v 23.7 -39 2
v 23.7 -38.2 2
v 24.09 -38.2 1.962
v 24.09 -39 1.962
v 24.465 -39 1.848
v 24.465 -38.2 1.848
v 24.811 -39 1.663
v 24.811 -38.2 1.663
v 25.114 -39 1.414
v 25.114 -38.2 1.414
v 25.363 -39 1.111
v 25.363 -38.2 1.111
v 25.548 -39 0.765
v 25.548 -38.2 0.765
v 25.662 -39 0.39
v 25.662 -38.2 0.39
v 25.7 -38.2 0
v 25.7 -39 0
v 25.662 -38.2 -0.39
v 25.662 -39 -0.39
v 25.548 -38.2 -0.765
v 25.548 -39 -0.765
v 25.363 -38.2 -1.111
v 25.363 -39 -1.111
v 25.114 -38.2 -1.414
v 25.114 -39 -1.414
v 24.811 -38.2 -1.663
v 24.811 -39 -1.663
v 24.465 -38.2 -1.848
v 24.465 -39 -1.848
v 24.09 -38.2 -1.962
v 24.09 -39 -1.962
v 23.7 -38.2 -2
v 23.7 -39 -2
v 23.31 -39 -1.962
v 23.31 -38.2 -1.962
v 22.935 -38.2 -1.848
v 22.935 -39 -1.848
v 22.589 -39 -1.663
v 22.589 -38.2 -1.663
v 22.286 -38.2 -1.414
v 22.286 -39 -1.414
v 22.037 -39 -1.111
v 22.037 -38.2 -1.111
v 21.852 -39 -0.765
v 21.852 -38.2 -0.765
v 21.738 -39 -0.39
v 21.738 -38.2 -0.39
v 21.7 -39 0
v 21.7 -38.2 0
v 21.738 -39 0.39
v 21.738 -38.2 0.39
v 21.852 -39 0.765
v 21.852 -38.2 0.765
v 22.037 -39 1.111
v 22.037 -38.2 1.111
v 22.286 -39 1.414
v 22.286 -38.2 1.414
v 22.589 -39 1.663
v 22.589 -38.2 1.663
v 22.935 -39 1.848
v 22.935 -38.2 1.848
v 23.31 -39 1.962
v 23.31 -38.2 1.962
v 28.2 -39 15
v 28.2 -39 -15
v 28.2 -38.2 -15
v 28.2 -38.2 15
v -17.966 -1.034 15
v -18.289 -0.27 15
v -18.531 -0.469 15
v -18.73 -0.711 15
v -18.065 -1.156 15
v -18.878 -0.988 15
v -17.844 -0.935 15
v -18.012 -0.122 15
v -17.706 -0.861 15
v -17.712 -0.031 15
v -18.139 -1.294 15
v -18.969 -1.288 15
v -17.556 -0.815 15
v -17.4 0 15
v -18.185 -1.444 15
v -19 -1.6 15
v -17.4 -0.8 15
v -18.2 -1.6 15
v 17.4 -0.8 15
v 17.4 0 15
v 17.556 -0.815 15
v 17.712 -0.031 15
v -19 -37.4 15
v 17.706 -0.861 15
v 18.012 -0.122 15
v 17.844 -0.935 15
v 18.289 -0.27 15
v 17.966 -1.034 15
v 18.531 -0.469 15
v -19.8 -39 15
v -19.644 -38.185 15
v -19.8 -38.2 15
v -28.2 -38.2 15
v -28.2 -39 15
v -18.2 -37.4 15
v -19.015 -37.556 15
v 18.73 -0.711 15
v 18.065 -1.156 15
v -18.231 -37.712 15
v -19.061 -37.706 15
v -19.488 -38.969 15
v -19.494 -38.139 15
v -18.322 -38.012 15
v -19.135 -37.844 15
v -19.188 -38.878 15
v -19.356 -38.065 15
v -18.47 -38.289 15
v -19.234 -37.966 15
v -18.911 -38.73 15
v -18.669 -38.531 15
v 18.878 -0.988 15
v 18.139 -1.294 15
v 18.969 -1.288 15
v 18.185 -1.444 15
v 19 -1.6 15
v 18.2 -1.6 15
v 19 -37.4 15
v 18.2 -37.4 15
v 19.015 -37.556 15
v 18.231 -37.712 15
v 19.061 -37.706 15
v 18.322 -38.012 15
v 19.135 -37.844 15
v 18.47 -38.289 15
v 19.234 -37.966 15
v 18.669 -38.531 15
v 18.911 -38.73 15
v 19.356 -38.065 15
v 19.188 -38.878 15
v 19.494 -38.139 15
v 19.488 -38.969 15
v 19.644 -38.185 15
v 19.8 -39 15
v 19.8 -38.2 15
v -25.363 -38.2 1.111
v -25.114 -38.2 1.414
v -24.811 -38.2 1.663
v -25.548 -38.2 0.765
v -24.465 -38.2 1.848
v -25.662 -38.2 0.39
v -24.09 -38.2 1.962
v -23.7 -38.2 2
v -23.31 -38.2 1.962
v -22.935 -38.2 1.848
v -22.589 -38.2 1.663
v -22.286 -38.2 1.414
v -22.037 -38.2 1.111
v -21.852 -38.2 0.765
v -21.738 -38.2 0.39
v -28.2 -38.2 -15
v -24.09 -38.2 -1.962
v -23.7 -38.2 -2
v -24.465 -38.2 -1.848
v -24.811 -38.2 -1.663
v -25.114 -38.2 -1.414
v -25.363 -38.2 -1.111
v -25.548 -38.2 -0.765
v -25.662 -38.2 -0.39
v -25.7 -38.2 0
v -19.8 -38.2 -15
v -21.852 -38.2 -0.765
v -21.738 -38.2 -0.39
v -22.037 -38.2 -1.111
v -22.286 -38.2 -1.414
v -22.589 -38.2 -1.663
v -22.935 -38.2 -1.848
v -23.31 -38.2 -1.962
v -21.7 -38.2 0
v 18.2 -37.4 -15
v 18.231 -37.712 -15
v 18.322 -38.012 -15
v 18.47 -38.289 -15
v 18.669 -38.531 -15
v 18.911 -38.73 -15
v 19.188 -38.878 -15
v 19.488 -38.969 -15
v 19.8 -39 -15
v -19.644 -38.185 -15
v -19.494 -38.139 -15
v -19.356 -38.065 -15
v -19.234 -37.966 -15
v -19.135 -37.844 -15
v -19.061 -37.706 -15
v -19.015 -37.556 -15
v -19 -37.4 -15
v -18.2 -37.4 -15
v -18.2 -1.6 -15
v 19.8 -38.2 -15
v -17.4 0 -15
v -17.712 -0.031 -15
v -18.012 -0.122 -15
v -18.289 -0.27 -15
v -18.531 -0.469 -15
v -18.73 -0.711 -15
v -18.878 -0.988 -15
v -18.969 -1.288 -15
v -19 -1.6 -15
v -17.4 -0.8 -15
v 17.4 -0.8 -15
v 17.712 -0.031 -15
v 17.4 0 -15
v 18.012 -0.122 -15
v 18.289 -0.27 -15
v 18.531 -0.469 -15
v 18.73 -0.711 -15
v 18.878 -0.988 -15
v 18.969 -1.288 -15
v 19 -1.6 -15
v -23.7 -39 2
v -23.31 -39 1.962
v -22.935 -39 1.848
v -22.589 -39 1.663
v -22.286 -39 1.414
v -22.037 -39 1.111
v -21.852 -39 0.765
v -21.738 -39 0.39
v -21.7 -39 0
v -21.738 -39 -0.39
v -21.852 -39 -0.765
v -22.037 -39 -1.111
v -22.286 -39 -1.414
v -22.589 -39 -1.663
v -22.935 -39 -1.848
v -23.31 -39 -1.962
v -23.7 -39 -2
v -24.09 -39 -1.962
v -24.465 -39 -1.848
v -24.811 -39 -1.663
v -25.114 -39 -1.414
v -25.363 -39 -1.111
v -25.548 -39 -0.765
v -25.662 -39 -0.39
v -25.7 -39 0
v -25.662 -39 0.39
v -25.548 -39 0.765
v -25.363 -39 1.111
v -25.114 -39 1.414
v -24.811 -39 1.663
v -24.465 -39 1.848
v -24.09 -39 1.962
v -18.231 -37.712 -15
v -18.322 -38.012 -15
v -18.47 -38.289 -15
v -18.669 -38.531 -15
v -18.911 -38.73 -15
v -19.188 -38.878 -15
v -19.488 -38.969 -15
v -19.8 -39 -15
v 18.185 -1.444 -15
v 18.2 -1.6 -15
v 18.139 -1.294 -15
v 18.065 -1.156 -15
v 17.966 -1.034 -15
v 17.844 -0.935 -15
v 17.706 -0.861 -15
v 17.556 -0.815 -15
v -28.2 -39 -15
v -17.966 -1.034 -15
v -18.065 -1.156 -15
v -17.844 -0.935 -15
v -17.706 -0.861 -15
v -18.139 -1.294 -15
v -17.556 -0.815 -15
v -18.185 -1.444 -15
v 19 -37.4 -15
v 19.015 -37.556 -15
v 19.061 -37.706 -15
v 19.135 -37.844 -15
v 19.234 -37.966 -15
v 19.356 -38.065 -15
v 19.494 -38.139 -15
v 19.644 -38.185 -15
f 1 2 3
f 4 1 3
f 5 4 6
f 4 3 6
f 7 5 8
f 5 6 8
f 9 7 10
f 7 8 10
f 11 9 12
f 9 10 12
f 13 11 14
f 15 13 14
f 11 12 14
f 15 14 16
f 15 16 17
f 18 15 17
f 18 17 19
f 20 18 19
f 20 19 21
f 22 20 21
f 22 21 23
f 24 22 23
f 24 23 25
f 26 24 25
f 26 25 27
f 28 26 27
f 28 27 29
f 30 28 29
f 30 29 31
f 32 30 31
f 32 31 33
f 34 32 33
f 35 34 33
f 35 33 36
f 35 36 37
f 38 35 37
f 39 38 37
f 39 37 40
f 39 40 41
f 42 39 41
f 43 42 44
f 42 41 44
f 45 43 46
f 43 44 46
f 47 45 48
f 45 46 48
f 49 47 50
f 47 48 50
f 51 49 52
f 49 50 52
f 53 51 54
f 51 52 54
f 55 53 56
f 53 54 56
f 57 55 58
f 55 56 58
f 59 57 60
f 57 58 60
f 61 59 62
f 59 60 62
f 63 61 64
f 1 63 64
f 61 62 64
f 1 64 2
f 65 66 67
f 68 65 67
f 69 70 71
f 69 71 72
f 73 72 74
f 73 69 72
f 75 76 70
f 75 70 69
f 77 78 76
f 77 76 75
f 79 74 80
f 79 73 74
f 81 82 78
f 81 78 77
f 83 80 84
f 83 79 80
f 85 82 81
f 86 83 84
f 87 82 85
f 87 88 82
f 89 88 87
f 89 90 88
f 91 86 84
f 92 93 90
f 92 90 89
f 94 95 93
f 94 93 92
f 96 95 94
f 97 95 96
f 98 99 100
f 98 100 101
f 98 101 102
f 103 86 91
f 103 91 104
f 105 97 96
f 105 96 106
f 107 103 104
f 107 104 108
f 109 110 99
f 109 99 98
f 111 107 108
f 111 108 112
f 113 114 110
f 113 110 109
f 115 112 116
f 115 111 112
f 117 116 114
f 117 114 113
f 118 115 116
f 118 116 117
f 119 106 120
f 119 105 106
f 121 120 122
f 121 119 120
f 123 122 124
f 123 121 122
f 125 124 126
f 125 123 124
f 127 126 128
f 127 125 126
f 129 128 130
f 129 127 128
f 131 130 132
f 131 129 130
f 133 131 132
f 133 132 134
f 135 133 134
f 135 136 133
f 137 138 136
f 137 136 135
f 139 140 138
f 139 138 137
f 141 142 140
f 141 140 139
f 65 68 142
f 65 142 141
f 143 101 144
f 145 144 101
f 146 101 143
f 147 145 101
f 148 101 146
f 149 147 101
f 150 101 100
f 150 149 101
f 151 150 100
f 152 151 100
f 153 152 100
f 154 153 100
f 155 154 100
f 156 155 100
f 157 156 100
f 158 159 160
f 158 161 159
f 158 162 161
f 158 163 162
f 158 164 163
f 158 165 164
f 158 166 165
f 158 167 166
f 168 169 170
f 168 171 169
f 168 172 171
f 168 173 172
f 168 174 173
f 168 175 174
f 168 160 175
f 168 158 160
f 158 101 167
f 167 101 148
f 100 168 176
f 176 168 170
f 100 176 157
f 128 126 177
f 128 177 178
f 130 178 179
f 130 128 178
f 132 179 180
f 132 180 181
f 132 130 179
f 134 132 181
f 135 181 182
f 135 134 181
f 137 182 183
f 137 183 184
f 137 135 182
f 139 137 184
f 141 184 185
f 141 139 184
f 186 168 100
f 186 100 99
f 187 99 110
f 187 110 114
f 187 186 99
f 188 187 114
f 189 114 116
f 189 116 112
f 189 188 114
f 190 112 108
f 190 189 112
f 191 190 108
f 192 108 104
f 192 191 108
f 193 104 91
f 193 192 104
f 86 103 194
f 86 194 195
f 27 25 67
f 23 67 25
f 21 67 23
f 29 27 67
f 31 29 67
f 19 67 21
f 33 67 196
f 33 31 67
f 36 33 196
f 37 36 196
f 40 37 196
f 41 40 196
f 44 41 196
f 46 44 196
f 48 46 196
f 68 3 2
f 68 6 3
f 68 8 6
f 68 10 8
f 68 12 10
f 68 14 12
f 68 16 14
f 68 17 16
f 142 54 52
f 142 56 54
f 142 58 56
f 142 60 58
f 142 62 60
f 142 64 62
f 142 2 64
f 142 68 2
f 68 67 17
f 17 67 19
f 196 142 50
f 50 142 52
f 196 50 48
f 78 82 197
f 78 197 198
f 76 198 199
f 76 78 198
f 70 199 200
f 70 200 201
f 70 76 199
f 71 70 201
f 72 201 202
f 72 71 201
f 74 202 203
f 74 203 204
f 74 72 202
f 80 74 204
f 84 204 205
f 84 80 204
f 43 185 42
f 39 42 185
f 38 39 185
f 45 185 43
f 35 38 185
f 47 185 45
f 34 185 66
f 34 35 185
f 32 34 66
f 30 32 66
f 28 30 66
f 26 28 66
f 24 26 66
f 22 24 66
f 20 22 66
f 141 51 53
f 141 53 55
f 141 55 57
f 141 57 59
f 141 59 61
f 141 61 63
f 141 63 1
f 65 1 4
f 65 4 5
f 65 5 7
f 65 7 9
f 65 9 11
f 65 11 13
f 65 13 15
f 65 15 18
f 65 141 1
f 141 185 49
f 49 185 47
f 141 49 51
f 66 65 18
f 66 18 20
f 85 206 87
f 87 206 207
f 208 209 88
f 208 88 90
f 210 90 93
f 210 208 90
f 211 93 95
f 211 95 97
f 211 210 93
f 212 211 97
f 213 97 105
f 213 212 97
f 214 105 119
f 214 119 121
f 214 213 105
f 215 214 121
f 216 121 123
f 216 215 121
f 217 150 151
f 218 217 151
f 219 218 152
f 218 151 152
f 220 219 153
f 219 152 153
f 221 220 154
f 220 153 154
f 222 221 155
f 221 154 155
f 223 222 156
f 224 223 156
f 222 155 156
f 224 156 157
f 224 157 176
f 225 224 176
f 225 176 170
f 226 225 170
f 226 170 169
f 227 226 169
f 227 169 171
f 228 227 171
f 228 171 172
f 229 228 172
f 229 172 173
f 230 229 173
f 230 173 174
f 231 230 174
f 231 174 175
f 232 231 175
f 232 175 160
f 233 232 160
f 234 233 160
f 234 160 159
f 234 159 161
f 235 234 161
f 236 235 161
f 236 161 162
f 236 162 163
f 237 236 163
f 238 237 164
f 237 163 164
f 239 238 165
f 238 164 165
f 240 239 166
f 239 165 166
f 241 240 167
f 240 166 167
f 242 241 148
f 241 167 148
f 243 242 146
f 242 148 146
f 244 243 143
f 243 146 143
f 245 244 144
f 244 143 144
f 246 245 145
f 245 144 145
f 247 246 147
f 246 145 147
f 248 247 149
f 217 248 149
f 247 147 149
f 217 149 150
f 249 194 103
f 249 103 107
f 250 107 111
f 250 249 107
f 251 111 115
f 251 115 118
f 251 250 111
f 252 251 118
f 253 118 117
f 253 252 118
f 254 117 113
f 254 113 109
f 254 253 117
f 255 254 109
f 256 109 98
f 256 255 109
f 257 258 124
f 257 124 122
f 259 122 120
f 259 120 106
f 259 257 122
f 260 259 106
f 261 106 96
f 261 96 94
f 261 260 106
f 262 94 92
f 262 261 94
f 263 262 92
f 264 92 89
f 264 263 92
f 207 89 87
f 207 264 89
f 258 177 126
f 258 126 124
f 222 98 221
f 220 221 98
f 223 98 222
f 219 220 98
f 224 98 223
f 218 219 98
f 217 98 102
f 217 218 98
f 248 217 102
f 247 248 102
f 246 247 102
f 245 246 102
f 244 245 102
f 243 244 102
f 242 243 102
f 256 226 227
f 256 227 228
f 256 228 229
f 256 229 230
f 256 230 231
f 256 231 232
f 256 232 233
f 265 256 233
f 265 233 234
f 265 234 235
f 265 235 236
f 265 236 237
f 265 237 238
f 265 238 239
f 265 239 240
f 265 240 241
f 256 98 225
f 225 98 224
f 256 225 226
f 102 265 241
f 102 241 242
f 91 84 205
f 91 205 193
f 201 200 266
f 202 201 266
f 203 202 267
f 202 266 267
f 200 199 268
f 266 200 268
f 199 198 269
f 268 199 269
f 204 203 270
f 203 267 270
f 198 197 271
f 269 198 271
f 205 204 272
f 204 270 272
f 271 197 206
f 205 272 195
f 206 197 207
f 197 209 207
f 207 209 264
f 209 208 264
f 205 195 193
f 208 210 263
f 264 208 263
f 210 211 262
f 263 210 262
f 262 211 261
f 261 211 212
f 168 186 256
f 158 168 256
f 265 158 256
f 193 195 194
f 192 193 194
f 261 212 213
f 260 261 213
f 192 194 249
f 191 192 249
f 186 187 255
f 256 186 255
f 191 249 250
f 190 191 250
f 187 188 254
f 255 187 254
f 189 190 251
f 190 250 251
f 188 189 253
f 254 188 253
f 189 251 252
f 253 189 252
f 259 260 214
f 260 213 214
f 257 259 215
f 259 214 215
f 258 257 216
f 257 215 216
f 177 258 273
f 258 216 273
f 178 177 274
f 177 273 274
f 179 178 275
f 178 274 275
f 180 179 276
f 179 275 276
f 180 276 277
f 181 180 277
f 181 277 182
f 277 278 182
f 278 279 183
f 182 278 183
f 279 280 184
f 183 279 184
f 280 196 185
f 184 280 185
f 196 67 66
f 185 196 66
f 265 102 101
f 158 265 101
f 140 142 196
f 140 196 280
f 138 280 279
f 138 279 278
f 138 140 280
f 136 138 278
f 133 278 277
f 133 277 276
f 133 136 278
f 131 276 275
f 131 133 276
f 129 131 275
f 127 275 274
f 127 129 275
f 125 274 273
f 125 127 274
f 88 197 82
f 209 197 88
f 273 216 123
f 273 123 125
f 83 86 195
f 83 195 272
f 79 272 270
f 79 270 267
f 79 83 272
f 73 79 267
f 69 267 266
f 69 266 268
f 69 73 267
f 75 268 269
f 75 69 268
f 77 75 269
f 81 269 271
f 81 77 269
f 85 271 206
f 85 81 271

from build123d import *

# Parameters (mm, degrees)
SKETCH1_W                      = 38
SKETCH1_H                      = 30
BASE_FLANGE1_DEPTH             = 0.8
EDGE_FLANGE1_STRIP_W           = 4.8
EDGE_FLANGE1_STRIP_H           = 0.8
EDGE_FLANGE1_STRIP_CUT_DEPTH   = 30
EDGE_FLANGE1_STRIP_2_W         = 4.8
EDGE_FLANGE1_STRIP_2_H         = 0.8
EDGE_FLANGE1_STRIP_CUT_2_DEPTH = 30
EDGE_FLANGE1_DEPTH             = 30
EDGE_FLANGE1_BEND_DEPTH        = 30
EDGE_FLANGE2_STRIP_W           = 4.8
EDGE_FLANGE2_STRIP_H           = 0.8
EDGE_FLANGE2_STRIP_CUT_DEPTH   = 30
EDGE_FLANGE2_STRIP_2_W         = 4.8
EDGE_FLANGE2_STRIP_2_H         = 0.8
EDGE_FLANGE2_STRIP_CUT_2_DEPTH = 30
EDGE_FLANGE2_DEPTH             = 30
EDGE_FLANGE2_BEND_DEPTH        = 30
SKETCH15_R                     = 2
CUT_EXTRUDE1_DEPTH             = 10


# Sheet-metal steps are written as plain solids
with BuildPart() as part:
    # Sketch1 → Base-Flange1 (new body)
    with BuildSketch(Plane(origin=(0, 0, 0), x_dir=(1, 0, 0), z_dir=(0, 1, 0))):
        Rectangle(SKETCH1_W, SKETCH1_H)
    extrude(amount=-BASE_FLANGE1_DEPTH)

    # Edge-Flange1 strip (across the edge) → Edge-Flange1 strip cut (cut)
    with BuildSketch(Plane(origin=(-19, -0.8, 15), x_dir=(1, 0, 0), z_dir=(0, 0, -1))):
        with Locations((-0.8, -0.4)):
            Rectangle(EDGE_FLANGE1_STRIP_W, EDGE_FLANGE1_STRIP_H)
    extrude(amount=EDGE_FLANGE1_STRIP_CUT_DEPTH, mode=Mode.SUBTRACT)

    # Edge-Flange1 strip 2 (across the edge) → Edge-Flange1 strip cut 2 (cut)
    with BuildSketch(Plane(origin=(19, -0.8, -15), x_dir=(-1, 0, 0), z_dir=(0, 0, 1))):
        with Locations((-0.8, -0.4)):
            Rectangle(EDGE_FLANGE1_STRIP_2_W, EDGE_FLANGE1_STRIP_2_H)
    extrude(amount=EDGE_FLANGE1_STRIP_CUT_2_DEPTH, mode=Mode.SUBTRACT)

    # Edge-Flange1 section (across the edge) → Edge-Flange1 (add)
    with BuildSketch(Plane(origin=(-19, -0.8, 15), x_dir=(1, 0, 0), z_dir=(0, 0, -1))):
        with BuildLine():
            Line((0, 0.8), (0, 38.2))
            Line((0, 38.2), (0.8, 38.2))
            Line((0.8, 38.2), (0.8, 0.8))
            ThreePointArc((0.8, 0.8), (1.034314575, 0.234314575), (1.6, 0))
            Line((1.6, 0), (1.6, -0.8))
            ThreePointArc((1.6, -0.8), (0.46862915, -0.33137085), (0, 0.8))
        make_face()
    extrude(amount=EDGE_FLANGE1_DEPTH)

    # Edge-Flange1 section 2 (across the edge) → Edge-Flange1 bend (add)
    with BuildSketch(Plane(origin=(19, -0.8, -15), x_dir=(-1, 0, 0), z_dir=(0, 0, 1))):
        with BuildLine():
            Line((0, 0.8), (0, 38.2))
            Line((0, 38.2), (0.8, 38.2))
            Line((0.8, 38.2), (0.8, 0.8))
            ThreePointArc((0.8, 0.8), (1.034314575, 0.234314575), (1.6, 0))
            Line((1.6, 0), (1.6, -0.8))
            ThreePointArc((1.6, -0.8), (0.46862915, -0.33137085), (0, 0.8))
        make_face()
    extrude(amount=EDGE_FLANGE1_BEND_DEPTH)

    # Edge-Flange2 strip (across the edge) → Edge-Flange2 strip cut (cut)
    with BuildSketch(Plane(origin=(-19, -39, -15), x_dir=(0, 1, 0), z_dir=(0, 0, 1))):
        with Locations((-0.8, -0.4)):
            Rectangle(EDGE_FLANGE2_STRIP_W, EDGE_FLANGE2_STRIP_H)
    extrude(amount=EDGE_FLANGE2_STRIP_CUT_DEPTH, mode=Mode.SUBTRACT)

    # Edge-Flange2 strip 2 (across the edge) → Edge-Flange2 strip cut 2 (cut)
    with BuildSketch(Plane(origin=(19, -39, 15), x_dir=(0, 1, 0), z_dir=(0, 0, -1))):
        with Locations((-0.8, -0.4)):
            Rectangle(EDGE_FLANGE2_STRIP_2_W, EDGE_FLANGE2_STRIP_2_H)
    extrude(amount=EDGE_FLANGE2_STRIP_CUT_2_DEPTH, mode=Mode.SUBTRACT)

    # Edge-Flange2 section (across the edge) → Edge-Flange2 (add)
    with BuildSketch(Plane(origin=(-19, -39, -15), x_dir=(0, 1, 0), z_dir=(0, 0, 1))):
        with BuildLine():
            Line((0, 0.8), (0, 9.2))
            Line((0, 9.2), (0.8, 9.2))
            Line((0.8, 9.2), (0.8, 0.8))
            ThreePointArc((0.8, 0.8), (1.034314575, 0.234314575), (1.6, 0))
            Line((1.6, 0), (1.6, -0.8))
            ThreePointArc((1.6, -0.8), (0.46862915, -0.33137085), (0, 0.8))
        make_face()
    extrude(amount=EDGE_FLANGE2_DEPTH)

    # Edge-Flange2 section 2 (across the edge) → Edge-Flange2 bend (add)
    with BuildSketch(Plane(origin=(19, -39, 15), x_dir=(0, 1, 0), z_dir=(0, 0, -1))):
        with BuildLine():
            Line((0, 0.8), (0, 9.2))
            Line((0, 9.2), (0.8, 9.2))
            Line((0.8, 9.2), (0.8, 0.8))
            ThreePointArc((0.8, 0.8), (1.034314575, 0.234314575), (1.6, 0))
            Line((1.6, 0), (1.6, -0.8))
            ThreePointArc((1.6, -0.8), (0.46862915, -0.33137085), (0, 0.8))
        make_face()
    extrude(amount=EDGE_FLANGE2_BEND_DEPTH)

    # Sketch15 → Cut-Extrude1 (cut)
    with BuildSketch(Plane(origin=(0, -38.2, 0), x_dir=(1, 0, 0), z_dir=(0, 1, 0))):
        with Locations(Location((-23.7, 0, 0), (0, 0, 270))):
            Circle(SKETCH15_R)
        with Locations(Location((23.7, 0, 0), (0, 0, 270))):
            Circle(SKETCH15_R)
    extrude(amount=-CUT_EXTRUDE1_DEPTH, mode=Mode.SUBTRACT)


solid = part.part
